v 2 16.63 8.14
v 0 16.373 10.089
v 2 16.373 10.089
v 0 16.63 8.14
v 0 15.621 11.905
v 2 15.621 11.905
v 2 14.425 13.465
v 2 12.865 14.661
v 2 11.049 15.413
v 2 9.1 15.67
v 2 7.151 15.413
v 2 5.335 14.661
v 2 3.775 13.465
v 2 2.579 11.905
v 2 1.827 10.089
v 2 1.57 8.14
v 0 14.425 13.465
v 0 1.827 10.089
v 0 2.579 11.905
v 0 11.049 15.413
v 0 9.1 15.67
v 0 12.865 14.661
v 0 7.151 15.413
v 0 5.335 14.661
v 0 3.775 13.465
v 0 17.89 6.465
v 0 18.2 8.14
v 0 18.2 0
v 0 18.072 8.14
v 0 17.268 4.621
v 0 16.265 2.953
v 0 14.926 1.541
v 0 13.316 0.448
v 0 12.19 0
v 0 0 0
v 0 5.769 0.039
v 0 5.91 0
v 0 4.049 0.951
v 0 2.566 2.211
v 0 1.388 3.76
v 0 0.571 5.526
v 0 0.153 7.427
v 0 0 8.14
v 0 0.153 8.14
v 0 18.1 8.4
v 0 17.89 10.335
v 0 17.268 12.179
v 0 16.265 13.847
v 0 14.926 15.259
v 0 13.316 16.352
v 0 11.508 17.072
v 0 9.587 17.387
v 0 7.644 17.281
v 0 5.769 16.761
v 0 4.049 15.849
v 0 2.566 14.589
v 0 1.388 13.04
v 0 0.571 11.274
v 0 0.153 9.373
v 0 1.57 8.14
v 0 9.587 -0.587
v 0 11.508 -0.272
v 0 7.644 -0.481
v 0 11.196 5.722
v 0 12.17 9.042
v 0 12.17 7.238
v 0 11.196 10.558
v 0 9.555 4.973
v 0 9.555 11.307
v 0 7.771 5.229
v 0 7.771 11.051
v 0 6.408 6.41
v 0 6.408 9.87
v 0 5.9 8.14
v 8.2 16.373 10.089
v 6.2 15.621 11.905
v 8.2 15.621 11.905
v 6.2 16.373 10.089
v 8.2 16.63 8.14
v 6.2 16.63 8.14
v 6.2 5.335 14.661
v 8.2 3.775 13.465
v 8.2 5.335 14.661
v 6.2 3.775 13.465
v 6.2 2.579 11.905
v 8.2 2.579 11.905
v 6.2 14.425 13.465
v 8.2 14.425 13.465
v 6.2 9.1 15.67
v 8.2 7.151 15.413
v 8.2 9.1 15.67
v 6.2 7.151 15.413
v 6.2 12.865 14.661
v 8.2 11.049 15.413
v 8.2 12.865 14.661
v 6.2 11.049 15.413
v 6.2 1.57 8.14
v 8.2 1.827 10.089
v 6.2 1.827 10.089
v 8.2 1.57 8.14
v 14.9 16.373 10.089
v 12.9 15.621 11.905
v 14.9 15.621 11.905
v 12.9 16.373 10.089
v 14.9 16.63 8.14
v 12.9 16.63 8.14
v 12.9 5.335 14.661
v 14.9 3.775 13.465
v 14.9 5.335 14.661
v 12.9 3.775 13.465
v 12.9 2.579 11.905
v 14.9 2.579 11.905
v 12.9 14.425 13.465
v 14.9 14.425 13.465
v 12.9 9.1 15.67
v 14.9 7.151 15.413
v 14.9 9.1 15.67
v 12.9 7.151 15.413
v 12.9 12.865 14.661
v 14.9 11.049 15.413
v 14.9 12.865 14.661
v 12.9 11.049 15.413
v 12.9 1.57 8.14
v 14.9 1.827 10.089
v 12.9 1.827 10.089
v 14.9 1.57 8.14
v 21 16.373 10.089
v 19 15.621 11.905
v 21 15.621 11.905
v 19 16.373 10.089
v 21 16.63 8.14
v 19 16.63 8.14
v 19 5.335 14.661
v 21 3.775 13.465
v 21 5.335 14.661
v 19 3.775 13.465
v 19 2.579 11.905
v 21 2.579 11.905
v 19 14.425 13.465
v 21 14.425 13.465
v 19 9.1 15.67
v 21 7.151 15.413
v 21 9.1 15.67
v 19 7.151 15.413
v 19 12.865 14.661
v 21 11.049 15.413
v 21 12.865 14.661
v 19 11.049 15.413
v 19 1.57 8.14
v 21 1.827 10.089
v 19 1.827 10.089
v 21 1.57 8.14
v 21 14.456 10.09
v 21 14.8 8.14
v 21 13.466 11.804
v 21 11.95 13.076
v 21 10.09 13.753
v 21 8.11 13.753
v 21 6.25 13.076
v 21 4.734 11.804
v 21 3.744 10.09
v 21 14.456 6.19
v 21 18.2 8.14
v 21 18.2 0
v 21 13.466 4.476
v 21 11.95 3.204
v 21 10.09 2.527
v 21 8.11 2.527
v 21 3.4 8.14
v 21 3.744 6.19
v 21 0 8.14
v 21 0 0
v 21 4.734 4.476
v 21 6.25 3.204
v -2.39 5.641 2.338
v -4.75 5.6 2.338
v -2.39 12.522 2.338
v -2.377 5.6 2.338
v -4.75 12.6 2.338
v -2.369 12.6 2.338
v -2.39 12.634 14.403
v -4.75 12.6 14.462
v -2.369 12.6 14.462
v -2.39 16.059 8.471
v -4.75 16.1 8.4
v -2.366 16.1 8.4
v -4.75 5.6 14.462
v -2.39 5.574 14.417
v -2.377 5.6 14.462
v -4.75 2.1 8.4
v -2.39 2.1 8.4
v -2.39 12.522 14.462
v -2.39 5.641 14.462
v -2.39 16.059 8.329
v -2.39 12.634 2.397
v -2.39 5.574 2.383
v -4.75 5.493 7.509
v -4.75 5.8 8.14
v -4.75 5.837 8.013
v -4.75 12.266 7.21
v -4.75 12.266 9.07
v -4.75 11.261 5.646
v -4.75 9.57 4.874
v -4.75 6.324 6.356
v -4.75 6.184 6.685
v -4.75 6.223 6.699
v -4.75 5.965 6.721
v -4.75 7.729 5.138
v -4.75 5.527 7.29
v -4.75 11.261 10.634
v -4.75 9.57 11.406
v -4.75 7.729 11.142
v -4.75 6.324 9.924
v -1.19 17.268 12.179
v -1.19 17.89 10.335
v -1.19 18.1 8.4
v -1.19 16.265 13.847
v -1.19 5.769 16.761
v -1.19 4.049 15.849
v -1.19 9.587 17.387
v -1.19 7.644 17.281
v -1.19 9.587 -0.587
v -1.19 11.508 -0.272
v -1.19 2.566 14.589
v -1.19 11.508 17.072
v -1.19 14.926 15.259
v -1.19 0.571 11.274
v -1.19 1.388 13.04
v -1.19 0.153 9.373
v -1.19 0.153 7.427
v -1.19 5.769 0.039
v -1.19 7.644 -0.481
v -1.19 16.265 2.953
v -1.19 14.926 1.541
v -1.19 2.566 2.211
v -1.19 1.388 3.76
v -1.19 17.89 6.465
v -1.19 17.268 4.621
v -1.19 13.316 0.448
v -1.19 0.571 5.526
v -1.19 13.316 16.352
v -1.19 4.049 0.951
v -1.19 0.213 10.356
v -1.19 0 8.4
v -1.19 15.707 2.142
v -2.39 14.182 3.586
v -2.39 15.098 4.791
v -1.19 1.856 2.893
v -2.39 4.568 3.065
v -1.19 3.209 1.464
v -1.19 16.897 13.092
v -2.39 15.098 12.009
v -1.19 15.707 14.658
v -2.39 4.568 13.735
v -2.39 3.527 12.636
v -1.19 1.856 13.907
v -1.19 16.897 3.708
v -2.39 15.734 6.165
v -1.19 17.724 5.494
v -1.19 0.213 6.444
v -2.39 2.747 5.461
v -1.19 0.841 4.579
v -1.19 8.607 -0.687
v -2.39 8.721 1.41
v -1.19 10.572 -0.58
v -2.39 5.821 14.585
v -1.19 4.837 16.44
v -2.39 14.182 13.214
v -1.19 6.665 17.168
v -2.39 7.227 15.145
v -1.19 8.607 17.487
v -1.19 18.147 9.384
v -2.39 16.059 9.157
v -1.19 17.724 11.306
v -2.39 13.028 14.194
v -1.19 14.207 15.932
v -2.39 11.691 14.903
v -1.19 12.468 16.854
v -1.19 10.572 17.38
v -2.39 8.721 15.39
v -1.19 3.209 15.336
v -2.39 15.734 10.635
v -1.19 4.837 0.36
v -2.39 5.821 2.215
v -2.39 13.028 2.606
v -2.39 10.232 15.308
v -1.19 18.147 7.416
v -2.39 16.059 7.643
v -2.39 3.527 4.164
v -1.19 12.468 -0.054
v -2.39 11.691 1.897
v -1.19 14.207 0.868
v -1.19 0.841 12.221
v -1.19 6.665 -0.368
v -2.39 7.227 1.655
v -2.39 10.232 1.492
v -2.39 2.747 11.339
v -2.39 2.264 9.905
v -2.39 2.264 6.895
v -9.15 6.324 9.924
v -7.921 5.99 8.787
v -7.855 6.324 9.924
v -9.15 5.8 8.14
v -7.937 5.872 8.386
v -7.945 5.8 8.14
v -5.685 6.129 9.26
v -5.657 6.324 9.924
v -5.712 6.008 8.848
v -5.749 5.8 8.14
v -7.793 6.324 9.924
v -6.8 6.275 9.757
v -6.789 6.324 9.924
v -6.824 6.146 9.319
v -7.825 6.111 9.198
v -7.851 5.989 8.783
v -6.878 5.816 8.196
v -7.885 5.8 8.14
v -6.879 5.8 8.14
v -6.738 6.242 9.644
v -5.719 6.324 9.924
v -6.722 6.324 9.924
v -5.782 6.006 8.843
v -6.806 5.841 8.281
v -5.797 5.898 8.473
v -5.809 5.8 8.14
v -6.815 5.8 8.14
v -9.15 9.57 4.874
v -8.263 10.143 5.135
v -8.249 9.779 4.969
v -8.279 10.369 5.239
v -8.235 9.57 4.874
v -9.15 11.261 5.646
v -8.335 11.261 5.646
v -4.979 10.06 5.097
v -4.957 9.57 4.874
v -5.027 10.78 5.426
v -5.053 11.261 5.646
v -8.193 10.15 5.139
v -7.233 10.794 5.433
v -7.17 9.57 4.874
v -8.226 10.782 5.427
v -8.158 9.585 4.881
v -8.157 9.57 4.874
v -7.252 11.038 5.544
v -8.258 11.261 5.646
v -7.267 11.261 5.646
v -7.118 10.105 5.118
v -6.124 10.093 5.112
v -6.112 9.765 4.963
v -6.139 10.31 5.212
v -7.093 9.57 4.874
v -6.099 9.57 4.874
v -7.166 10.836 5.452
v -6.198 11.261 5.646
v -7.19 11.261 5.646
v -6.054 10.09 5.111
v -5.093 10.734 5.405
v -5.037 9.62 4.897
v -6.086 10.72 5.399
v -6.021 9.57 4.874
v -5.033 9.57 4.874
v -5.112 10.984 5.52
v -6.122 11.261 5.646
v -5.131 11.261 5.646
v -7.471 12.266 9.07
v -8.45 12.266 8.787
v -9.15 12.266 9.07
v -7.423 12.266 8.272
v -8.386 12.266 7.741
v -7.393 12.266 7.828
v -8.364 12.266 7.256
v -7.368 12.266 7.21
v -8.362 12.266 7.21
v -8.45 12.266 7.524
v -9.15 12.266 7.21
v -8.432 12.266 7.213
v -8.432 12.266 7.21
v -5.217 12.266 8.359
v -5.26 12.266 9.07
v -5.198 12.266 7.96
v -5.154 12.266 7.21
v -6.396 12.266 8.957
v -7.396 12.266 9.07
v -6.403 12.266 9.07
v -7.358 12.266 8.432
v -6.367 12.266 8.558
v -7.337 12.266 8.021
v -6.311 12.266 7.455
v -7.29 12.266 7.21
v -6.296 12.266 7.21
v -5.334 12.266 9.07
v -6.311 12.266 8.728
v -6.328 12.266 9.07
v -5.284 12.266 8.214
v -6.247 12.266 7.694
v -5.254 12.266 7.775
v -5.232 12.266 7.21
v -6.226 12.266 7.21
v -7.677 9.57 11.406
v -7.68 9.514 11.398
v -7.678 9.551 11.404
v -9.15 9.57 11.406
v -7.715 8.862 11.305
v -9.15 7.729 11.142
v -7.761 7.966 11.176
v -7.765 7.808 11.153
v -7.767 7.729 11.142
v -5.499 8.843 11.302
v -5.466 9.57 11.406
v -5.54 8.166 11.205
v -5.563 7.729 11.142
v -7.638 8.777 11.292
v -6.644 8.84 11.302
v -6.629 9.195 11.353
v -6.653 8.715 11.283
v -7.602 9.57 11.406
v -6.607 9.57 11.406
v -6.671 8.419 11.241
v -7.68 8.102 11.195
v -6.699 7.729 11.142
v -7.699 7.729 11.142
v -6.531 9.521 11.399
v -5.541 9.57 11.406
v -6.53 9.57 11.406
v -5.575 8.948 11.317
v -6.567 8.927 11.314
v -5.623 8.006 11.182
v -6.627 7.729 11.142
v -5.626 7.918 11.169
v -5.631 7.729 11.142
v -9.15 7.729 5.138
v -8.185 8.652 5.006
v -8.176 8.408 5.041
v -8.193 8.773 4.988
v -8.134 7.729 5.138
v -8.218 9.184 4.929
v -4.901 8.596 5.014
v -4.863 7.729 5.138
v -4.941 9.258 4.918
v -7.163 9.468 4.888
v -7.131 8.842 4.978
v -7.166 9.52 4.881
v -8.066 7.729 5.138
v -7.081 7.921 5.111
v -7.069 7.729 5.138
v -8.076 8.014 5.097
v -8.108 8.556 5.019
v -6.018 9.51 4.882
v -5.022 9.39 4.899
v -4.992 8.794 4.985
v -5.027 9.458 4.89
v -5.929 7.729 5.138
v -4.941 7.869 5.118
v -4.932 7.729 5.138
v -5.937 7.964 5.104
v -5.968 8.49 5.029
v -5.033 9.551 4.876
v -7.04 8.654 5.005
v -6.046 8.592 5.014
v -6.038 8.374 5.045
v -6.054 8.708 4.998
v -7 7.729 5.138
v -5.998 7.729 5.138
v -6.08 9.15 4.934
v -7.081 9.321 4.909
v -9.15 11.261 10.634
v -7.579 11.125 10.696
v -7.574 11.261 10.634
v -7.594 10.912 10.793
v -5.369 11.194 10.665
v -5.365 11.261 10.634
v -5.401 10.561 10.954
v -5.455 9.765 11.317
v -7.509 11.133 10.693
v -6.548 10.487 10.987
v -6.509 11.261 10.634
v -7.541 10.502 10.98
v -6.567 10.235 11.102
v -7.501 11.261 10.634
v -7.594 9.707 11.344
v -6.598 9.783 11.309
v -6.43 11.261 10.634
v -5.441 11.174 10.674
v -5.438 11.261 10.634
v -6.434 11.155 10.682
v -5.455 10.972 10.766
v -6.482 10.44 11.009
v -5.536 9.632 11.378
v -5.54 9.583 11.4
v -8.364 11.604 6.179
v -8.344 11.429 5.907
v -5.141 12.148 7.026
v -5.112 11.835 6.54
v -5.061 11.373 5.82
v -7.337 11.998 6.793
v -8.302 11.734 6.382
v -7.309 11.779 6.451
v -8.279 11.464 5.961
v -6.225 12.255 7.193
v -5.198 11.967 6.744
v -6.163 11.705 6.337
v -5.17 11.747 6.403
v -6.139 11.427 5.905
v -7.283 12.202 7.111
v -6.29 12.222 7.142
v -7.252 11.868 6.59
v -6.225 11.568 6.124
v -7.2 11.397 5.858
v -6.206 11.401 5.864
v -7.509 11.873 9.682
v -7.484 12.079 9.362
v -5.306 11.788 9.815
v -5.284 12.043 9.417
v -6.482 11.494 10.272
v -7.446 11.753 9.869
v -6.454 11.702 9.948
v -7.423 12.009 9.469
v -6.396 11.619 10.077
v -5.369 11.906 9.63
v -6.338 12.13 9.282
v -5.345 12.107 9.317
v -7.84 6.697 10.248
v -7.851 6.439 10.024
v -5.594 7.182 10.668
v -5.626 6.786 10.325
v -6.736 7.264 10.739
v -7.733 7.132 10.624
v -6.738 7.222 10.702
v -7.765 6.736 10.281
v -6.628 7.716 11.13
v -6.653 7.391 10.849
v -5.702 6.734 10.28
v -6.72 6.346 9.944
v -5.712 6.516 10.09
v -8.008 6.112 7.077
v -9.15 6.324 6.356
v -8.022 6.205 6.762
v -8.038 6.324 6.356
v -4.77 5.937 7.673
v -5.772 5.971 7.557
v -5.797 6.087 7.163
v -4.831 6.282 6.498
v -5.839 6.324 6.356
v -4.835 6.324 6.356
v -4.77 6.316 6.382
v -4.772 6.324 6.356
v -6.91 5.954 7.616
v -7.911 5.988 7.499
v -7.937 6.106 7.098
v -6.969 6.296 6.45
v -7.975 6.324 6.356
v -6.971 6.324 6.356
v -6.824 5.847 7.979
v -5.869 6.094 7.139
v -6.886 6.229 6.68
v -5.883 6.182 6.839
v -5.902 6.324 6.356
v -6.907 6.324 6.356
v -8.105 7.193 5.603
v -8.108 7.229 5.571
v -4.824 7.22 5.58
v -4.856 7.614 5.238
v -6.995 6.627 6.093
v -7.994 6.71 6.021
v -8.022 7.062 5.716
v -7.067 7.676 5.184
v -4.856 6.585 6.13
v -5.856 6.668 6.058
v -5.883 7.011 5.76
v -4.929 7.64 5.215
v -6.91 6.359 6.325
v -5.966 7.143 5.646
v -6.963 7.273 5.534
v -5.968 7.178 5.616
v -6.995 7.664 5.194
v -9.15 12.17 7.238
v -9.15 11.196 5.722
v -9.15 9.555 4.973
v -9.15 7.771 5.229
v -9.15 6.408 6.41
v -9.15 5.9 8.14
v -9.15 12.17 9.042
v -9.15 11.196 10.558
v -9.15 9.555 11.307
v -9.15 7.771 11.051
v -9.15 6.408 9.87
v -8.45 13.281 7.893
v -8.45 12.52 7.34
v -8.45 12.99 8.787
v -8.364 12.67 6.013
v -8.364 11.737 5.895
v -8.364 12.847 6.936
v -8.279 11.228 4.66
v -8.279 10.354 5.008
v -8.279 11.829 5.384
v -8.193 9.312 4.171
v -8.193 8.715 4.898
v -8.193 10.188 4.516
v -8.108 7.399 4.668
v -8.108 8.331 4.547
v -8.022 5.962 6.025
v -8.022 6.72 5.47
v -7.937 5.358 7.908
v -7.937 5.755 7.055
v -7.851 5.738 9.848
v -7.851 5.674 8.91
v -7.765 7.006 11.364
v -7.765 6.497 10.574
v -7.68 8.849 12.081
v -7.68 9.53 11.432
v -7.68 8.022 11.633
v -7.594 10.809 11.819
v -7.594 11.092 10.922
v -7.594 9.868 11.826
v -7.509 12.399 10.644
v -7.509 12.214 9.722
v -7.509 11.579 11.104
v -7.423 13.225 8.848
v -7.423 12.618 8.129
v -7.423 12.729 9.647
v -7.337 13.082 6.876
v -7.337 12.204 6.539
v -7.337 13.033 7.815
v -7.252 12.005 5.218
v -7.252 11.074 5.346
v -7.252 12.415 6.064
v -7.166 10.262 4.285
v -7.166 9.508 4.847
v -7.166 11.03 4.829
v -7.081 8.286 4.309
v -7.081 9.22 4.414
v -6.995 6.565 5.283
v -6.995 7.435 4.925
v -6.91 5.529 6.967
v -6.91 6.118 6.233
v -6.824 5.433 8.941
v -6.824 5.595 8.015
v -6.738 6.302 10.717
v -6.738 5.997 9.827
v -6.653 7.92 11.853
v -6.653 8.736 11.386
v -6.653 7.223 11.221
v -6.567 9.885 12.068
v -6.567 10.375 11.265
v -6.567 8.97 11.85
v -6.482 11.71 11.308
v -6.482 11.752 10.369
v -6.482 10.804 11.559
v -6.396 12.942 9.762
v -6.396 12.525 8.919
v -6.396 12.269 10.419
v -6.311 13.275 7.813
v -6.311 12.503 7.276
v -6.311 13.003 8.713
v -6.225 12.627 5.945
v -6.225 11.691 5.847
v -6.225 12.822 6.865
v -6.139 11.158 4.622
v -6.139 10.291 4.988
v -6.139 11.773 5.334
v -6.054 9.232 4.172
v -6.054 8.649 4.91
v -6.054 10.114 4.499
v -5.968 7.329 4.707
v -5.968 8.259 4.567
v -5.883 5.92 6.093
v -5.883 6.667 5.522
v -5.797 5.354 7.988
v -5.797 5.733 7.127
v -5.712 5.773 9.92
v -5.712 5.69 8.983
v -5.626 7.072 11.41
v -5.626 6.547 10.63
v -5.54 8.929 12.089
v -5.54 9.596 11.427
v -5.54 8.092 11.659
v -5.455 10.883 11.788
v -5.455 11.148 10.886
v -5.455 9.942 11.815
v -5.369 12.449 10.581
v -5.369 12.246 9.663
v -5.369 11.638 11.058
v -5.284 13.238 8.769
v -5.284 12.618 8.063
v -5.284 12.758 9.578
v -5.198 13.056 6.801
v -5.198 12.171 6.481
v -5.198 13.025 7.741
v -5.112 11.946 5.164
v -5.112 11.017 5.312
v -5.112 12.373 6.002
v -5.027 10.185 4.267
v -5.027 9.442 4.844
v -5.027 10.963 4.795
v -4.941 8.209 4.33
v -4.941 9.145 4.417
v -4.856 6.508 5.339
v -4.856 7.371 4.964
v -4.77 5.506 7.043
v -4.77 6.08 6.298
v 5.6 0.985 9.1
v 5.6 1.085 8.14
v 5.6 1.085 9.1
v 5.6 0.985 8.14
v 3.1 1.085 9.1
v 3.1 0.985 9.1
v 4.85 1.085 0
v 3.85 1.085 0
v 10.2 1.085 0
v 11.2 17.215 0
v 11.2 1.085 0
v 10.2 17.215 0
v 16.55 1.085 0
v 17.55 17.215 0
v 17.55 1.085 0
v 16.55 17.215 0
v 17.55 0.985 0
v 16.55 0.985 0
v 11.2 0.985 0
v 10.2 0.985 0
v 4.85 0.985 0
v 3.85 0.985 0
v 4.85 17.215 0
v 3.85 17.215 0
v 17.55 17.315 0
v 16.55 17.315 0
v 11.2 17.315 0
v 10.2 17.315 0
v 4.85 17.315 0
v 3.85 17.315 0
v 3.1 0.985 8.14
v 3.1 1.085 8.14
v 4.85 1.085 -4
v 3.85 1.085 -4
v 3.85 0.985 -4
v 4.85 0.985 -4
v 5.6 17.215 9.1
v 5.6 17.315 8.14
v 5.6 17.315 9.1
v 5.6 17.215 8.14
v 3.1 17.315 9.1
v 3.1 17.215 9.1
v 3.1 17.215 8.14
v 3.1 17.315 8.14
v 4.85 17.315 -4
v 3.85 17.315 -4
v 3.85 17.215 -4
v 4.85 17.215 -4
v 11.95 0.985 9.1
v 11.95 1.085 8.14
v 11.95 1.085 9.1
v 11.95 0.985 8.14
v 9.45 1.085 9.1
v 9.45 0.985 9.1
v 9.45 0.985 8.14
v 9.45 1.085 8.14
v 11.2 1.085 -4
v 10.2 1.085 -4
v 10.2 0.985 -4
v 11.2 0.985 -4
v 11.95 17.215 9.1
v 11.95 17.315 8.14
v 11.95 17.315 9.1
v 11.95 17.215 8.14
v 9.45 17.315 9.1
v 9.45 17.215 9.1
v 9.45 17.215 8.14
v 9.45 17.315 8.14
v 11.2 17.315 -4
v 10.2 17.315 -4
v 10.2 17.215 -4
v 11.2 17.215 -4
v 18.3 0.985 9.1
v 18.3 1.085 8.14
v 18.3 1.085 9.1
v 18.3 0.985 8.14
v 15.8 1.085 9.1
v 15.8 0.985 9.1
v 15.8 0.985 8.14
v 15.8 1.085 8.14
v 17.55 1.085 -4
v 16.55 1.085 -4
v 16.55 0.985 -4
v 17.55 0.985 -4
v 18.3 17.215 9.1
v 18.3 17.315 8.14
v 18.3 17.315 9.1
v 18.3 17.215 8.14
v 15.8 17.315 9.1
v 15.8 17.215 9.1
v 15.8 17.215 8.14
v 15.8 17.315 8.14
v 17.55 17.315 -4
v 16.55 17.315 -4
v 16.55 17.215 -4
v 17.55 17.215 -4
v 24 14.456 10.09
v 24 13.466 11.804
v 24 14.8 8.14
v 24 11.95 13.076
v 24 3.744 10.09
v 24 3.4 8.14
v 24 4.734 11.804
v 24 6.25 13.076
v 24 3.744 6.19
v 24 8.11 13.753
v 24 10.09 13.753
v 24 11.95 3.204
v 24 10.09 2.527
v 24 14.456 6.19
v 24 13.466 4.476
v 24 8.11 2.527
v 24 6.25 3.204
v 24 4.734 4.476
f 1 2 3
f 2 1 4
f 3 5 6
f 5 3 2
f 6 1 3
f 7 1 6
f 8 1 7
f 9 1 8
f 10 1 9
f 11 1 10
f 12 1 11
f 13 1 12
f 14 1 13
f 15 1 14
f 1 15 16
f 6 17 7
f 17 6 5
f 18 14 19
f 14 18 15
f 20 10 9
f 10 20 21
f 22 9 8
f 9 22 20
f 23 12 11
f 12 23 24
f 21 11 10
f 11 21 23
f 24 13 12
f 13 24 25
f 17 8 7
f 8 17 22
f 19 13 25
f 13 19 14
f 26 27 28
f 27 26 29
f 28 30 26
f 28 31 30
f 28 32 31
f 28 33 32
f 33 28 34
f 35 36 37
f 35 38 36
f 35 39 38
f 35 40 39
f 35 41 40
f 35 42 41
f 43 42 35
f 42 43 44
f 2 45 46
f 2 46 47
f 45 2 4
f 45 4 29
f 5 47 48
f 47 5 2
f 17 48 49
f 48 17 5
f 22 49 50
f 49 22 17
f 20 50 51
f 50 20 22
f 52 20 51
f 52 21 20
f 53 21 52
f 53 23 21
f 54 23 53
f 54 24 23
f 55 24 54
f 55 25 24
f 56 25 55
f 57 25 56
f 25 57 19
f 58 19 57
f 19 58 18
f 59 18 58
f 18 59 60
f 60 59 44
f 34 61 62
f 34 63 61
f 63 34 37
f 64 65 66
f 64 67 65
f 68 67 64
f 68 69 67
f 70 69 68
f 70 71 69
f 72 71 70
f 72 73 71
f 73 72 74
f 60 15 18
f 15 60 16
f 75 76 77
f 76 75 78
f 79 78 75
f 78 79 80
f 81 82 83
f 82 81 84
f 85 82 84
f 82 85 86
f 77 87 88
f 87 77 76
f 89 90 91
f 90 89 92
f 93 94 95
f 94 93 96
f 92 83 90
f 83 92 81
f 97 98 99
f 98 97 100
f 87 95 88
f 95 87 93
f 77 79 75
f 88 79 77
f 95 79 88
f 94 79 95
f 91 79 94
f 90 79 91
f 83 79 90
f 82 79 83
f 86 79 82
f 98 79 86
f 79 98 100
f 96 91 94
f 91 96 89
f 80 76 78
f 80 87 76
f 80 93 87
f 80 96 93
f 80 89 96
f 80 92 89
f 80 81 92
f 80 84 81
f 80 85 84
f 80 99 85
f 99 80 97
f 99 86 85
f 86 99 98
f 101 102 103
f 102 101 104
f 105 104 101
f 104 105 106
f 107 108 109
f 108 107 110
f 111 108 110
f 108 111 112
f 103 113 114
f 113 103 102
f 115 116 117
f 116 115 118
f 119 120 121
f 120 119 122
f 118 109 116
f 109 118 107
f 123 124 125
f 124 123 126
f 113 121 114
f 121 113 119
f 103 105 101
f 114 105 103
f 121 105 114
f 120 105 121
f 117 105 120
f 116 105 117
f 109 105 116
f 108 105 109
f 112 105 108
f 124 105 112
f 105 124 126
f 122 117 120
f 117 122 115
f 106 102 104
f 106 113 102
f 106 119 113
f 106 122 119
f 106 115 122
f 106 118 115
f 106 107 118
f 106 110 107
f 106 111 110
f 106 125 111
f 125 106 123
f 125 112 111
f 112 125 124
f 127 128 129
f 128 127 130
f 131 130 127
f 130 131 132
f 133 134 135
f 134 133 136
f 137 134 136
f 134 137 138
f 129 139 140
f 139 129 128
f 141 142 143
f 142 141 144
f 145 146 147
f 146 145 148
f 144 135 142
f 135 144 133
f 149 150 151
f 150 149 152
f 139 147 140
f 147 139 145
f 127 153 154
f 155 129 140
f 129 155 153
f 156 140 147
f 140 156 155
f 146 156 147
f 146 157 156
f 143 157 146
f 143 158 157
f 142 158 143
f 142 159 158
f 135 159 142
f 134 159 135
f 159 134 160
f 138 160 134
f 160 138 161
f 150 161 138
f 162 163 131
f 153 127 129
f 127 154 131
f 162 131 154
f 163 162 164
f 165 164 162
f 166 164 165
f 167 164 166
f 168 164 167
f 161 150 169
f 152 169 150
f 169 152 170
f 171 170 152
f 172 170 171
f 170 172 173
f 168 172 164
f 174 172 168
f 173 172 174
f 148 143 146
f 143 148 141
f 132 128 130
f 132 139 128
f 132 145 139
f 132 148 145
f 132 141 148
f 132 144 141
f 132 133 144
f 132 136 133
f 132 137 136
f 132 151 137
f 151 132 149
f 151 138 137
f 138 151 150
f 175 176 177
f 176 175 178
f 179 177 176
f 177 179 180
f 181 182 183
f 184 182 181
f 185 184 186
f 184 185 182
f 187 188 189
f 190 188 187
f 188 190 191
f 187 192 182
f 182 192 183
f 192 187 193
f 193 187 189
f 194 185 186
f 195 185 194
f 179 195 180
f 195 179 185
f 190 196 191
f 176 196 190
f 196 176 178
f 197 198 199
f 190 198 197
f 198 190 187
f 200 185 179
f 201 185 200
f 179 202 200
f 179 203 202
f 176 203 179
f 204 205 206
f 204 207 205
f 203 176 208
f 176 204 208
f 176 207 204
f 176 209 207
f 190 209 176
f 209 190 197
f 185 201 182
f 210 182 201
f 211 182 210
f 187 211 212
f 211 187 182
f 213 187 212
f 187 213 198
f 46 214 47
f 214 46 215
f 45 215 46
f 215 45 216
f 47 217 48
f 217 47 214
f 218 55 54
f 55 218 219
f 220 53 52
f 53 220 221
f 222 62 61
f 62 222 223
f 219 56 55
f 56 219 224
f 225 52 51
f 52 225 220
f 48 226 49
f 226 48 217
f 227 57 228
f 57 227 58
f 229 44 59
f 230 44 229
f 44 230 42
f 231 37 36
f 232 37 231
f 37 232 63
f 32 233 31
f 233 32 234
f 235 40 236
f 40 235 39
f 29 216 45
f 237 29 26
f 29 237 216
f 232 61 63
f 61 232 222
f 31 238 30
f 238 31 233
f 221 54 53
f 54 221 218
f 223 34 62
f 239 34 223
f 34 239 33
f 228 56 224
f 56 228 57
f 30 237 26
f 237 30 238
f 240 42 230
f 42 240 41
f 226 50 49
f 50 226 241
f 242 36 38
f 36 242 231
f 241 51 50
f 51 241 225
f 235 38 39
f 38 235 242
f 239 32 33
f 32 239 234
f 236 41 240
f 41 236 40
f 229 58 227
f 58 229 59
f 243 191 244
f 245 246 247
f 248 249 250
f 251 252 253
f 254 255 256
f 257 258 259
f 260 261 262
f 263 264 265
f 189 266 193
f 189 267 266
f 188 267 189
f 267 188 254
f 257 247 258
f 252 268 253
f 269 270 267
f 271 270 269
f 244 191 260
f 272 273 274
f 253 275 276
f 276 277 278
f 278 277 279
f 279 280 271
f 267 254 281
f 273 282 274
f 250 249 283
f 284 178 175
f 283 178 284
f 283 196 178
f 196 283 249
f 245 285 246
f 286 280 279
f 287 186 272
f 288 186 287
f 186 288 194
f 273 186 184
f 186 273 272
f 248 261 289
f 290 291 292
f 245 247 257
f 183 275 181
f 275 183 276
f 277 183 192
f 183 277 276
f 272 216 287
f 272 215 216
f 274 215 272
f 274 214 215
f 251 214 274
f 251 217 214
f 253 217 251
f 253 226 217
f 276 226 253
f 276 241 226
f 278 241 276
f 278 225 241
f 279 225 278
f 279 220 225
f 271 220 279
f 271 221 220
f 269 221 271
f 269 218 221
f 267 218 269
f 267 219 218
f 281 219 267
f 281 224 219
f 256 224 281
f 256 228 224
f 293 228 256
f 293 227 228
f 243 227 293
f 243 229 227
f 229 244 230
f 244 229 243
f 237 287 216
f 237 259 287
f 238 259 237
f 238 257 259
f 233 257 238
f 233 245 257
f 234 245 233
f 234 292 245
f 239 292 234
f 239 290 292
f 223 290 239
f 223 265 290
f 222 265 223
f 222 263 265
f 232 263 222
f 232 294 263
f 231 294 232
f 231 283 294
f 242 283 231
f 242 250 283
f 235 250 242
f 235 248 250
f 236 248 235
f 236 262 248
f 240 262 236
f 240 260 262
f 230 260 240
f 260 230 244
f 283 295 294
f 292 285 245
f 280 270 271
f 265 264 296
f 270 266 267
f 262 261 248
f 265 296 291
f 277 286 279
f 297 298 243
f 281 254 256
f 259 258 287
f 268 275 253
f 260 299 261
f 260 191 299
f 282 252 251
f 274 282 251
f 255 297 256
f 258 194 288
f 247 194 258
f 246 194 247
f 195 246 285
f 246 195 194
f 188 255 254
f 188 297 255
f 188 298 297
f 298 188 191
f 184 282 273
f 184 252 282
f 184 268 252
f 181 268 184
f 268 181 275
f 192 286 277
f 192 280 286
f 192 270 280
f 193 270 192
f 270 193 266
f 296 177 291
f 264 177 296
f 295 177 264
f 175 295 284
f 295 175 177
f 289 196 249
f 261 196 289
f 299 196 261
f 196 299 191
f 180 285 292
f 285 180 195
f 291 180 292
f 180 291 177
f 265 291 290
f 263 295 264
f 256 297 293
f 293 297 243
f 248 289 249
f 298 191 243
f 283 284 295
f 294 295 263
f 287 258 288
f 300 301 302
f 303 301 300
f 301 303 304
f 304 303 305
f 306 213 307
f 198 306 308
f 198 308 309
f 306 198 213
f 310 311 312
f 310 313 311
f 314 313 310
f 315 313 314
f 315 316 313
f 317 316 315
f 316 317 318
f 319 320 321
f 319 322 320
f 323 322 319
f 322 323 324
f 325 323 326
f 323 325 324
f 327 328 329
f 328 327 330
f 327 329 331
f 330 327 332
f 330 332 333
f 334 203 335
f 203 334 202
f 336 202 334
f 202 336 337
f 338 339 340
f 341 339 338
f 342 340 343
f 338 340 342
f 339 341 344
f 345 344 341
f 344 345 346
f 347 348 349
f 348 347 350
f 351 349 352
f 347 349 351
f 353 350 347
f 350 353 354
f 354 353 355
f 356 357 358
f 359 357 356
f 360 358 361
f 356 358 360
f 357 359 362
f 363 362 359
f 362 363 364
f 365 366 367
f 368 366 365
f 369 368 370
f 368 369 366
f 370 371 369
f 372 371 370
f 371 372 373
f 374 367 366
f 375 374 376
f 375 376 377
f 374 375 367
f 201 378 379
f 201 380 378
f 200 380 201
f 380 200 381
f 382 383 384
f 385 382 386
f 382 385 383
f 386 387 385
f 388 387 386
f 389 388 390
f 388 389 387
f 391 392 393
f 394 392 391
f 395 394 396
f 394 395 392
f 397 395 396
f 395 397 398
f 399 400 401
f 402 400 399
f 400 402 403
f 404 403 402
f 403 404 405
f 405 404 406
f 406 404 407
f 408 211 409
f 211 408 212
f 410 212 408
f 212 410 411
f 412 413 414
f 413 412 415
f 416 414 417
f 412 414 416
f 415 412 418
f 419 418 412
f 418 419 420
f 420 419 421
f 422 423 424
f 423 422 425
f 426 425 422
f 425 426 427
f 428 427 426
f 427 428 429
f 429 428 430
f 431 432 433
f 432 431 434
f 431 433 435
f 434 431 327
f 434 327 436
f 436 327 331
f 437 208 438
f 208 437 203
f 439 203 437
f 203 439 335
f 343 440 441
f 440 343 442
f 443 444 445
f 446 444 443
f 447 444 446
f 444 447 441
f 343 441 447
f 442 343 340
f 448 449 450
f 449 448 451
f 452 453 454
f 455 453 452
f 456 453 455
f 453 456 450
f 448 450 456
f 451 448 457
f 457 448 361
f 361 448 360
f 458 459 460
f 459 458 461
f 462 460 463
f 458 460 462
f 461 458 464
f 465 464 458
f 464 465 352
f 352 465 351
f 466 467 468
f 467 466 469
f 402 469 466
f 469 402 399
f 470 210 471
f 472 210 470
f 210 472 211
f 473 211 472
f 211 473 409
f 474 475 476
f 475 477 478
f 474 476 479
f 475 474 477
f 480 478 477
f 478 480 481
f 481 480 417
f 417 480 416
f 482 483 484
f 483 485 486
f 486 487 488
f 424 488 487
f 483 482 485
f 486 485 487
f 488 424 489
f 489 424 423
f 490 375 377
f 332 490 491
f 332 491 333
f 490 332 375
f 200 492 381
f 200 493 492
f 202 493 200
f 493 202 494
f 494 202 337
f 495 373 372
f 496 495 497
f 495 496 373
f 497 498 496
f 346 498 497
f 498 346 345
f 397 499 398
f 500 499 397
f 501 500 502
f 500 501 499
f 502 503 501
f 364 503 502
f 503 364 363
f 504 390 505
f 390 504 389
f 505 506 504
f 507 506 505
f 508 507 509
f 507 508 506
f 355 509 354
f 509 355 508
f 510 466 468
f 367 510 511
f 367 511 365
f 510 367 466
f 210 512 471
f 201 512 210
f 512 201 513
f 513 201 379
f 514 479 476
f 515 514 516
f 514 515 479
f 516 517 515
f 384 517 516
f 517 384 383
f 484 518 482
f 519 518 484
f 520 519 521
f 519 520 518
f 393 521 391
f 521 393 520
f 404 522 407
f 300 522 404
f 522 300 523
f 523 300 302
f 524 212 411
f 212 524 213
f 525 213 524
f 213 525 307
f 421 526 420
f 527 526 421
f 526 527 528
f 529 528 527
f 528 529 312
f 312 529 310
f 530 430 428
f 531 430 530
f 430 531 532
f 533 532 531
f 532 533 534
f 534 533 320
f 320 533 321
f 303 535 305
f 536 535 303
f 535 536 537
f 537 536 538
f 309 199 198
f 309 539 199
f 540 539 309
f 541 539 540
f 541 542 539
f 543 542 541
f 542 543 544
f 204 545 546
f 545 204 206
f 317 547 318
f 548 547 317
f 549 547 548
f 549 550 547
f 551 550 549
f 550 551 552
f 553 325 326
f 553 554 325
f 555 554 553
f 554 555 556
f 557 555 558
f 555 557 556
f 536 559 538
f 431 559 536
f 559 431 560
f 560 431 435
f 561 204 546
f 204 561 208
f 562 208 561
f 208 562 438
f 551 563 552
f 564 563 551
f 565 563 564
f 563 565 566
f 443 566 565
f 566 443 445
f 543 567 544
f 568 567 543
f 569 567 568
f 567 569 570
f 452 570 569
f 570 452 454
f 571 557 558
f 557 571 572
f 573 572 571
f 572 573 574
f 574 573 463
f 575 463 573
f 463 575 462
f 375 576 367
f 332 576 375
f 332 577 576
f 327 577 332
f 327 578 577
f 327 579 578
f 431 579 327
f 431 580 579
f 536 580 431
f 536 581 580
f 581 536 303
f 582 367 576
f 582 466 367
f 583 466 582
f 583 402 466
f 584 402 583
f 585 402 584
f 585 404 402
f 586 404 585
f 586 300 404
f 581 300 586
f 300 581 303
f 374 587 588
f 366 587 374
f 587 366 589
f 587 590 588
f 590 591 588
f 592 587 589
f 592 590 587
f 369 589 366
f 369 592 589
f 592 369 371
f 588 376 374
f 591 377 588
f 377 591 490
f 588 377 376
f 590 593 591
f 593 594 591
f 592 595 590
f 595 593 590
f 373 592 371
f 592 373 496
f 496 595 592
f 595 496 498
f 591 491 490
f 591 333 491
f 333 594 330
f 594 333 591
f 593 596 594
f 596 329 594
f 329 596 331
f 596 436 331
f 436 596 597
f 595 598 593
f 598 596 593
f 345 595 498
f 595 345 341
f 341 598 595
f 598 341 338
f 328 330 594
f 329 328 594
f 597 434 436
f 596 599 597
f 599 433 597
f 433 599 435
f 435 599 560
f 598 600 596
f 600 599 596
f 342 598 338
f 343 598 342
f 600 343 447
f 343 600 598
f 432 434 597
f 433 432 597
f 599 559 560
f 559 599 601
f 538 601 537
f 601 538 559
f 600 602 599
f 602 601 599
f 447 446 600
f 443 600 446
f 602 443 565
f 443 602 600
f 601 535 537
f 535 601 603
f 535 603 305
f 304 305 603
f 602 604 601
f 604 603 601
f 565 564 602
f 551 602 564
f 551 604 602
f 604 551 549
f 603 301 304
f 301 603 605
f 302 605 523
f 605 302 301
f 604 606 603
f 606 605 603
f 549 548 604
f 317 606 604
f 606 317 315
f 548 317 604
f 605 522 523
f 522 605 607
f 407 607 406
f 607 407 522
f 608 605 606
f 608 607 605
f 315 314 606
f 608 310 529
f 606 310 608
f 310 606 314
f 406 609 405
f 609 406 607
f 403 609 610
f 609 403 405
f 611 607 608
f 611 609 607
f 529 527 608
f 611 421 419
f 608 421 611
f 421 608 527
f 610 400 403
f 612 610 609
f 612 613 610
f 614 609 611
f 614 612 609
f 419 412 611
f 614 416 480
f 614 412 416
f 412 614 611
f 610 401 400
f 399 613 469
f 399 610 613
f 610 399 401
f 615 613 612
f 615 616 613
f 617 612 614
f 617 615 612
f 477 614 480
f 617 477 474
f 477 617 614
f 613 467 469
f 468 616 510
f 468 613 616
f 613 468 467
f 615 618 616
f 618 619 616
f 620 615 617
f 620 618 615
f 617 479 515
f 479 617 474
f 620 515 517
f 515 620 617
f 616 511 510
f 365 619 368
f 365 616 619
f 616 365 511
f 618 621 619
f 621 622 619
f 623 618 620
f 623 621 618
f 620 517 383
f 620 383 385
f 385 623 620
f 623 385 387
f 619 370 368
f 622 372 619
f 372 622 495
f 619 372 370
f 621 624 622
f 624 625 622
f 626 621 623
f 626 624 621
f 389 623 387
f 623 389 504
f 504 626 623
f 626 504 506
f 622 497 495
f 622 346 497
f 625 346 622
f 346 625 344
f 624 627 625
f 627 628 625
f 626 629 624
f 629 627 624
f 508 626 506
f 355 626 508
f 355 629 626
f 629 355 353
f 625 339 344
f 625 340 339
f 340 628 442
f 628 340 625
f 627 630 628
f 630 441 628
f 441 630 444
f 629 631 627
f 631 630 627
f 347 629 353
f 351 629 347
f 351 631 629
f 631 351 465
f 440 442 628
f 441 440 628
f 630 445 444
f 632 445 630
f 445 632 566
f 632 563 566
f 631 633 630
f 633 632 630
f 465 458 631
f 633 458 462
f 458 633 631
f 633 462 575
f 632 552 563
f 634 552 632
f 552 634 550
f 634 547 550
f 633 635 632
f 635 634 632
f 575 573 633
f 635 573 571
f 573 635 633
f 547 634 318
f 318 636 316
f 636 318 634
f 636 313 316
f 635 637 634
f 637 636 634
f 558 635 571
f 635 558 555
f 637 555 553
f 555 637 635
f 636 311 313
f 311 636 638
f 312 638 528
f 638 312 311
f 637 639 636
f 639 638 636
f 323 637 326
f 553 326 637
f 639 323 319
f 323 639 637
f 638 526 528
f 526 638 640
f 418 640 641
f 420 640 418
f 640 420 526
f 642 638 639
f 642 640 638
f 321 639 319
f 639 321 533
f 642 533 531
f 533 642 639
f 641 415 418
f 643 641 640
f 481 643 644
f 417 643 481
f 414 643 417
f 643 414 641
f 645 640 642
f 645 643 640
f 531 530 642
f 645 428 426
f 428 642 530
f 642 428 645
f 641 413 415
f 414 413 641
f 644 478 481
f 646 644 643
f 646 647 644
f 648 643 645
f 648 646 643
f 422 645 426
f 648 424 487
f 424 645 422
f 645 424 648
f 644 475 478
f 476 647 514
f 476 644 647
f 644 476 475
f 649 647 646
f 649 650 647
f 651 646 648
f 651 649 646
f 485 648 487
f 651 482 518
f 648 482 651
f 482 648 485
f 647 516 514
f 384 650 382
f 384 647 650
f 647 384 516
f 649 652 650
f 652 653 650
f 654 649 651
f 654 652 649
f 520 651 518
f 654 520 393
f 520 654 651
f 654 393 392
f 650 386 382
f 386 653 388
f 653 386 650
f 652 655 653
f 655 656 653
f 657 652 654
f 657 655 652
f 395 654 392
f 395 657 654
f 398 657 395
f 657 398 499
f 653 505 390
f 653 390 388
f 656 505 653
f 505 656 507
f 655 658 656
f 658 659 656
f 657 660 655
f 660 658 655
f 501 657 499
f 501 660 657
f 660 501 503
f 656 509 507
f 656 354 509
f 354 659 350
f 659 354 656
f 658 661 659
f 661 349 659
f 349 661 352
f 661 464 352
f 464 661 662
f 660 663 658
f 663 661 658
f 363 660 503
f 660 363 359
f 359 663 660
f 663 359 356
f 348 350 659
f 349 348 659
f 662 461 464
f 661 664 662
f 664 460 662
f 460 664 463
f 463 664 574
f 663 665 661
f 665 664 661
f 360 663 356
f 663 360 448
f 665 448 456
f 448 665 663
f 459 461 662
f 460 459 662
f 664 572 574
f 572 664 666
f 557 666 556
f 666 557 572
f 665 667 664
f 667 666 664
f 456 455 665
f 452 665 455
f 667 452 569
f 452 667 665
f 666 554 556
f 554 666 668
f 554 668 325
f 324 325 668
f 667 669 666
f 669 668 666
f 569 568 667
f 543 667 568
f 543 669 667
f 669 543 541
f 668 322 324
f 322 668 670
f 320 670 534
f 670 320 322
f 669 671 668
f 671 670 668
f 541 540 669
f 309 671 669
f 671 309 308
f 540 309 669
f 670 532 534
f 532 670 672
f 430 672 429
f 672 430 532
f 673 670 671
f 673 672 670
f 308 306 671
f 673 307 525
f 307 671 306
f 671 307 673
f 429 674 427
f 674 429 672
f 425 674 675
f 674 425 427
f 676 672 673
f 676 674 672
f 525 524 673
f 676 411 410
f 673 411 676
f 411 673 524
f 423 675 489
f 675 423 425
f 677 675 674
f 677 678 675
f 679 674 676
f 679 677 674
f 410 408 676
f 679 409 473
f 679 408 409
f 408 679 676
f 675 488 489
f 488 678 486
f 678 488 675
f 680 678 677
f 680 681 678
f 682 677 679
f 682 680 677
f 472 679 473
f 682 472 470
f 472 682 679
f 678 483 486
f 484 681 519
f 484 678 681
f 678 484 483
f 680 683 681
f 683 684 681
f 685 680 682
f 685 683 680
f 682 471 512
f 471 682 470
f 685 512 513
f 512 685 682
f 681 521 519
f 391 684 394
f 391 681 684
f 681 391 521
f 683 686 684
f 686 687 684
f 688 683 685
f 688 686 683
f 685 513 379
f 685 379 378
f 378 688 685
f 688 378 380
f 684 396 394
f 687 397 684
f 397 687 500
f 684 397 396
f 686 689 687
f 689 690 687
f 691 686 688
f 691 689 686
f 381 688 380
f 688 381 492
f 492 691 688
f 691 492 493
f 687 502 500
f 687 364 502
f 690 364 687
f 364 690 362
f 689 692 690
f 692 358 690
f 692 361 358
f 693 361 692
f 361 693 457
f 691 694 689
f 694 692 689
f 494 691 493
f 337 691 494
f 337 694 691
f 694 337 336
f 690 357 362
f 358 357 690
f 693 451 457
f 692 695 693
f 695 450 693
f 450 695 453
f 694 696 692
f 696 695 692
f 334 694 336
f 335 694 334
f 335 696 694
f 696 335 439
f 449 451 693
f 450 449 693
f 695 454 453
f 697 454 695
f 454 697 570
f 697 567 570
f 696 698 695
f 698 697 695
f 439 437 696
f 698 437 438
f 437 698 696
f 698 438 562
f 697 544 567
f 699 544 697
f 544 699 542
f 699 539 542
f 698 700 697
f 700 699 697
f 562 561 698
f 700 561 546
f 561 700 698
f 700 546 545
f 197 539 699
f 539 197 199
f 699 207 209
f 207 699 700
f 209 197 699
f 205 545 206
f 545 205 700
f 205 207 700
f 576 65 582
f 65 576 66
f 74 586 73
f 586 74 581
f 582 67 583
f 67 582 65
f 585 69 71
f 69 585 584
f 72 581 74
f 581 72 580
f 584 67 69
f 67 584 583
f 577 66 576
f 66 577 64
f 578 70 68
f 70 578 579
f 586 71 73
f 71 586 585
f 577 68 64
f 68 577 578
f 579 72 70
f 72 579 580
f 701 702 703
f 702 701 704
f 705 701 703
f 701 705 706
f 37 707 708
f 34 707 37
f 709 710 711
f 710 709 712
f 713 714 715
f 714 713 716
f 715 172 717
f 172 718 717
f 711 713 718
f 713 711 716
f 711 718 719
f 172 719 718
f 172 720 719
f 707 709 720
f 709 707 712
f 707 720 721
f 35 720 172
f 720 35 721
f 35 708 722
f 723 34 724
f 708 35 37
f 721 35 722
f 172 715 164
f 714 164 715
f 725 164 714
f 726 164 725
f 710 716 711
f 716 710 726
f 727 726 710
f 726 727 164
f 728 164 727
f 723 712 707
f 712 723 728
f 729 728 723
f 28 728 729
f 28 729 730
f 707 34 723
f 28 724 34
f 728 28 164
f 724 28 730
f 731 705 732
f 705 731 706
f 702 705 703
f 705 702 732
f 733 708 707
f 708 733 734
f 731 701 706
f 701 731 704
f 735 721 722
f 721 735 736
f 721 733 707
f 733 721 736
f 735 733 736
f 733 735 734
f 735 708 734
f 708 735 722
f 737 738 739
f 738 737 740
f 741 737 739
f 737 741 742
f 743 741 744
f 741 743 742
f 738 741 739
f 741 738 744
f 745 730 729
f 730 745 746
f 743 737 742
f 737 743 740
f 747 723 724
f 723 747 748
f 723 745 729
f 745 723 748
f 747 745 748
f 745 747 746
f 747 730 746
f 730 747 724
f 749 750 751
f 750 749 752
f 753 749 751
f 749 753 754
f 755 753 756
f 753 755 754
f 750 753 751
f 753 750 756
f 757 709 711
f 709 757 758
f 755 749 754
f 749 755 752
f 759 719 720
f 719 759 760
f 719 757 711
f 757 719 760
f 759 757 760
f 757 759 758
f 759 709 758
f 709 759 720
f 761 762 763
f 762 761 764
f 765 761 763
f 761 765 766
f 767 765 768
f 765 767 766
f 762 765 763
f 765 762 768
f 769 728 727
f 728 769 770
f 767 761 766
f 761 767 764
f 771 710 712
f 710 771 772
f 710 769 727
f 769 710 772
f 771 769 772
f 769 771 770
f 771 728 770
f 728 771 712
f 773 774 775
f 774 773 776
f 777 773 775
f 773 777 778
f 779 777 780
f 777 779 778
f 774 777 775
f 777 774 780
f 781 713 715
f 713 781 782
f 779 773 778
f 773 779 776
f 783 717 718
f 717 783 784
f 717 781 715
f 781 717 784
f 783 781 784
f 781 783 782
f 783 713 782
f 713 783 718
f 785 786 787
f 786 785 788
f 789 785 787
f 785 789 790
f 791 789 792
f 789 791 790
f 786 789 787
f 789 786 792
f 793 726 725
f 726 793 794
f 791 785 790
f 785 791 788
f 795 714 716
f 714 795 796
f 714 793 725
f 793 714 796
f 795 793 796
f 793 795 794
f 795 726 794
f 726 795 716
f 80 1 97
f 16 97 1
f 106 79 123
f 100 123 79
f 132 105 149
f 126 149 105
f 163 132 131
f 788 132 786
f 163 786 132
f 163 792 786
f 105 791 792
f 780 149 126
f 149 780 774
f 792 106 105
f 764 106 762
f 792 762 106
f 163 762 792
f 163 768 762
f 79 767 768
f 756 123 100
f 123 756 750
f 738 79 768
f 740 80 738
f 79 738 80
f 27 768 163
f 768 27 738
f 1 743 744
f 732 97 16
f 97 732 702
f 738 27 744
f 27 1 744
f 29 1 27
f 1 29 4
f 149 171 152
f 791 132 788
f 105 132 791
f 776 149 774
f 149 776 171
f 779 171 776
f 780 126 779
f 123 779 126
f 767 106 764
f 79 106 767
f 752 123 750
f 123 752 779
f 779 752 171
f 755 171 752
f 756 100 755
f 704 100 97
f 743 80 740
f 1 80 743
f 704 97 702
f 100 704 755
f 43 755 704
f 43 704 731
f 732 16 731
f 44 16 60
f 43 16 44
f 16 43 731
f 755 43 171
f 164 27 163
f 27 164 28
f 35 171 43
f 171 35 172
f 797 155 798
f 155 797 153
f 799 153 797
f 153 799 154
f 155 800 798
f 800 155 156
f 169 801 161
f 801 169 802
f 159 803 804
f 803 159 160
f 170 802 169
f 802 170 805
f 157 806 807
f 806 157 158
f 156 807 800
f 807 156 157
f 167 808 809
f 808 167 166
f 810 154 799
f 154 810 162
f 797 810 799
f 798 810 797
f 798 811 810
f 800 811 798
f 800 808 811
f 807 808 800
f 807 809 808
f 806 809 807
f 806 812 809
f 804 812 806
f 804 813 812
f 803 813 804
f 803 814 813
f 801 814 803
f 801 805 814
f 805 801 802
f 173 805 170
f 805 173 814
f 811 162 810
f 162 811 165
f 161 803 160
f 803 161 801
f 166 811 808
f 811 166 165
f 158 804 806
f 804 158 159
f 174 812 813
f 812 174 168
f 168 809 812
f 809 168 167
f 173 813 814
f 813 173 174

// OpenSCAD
/* 2014 Don Bosley : 
For updates/corrections email : don@bosleymusic.com
Mechanical Drawing
Compatible with Neutrik products : 
- stereo jack, switched, full threaded nose and straight PCB pins
NMJ6HFD2
NMJ6HFD2-AU (gold plated)

*/

//MAIN BODY
translate([0,0,0])
color("black") 
cube([21,18.2,8.14]); 

//FRONT 
//BODY SECTIONS
for (i = [ [0,9.1,8.14],
		   [6.2,9.1,8.14],
		   [12.9,9.1,8.14],
		   [19,9.1,8.14],
])
{
	color("black")
	translate(i)
	rotate([90,0,90])
	cylinder(r=15.67-8.14, h=2); 
}

//REAR CYLINDER
color("black")
translate([20.9,9.1,8.14])
rotate([90,0,90]) 
cylinder(r=5.7,h=3.1);


difference(){
	union(){
		//NUT
		color("lightgrey")
		translate([.25, 9.1,8.4])
		rotate([90,0,-90])
		cylinder(r=7,h=5, $fn=6); 
		
//FRONT WASHER
			color("black")
			translate([-1.2,9.1,8.4])
			rotate([90,0,90])
			cylinder(r=9, h=1.2); 

//FRONT BEVEL / NUT
		color("black")
		translate([-1.19, 9.1,8.4])
		rotate([90,0,-90])
		cylinder(r2=7, r1=9.1,h=1.2);
//MAIN SHAFT 
		color("black")
		translate([-.15, 9.1,8.14])
		rotate([90,0,-90])
		cylinder(r=3.3,h=9); 
//FRONT SCREW THREAD
		color("black")
		translate([-4, 15.75-6.43, 8.14])
		rotate([0,90,0])
		linear_extrude(height = 8.9, center = true, convexity = 10, twist = 3000)
		translate([0, 3.2, 1])
		circle(r = .8); 
	}
//NUTHOLE
color("black")
translate([8, 9.1,8.14])
rotate([90,0,-90])
cylinder(r=3.2,h=24); 
}


/*ENSURE PIN CENTERS ARE ALIGNED (COMMENT OUT)
for (i = [  [4,2.23/2,-2],//S
		   [4,18.2-2.23/2,-2],//SN
		   [16.7,2.23/2,-2],//T
		   [16.7,18.2-2.23/2,-2],//TN

 ])
{
	translate(i)
	color("blue")
	cylinder(r=.7, h=9);
}
*/
//PINS 
for(i = [
	     [4.35-1.25,.985,0],//S
		 [4.35-1.25,18.2-.985,0],//SN
		 [10.7-1.25,.985,0],//R
		 [10.7-1.25,18.2-.985,0],//RN
	     [17.05-1.25,.985,0],//T
		 [17.05-1.25,18.2-.985,0],//TN

])
{
	translate(i)
	color("lightgrey") 
	union(){
		cube([2.5,.1,9.1]);  
		translate([.75,0,-4])
		cube([1,.1,4]);
	}
}
